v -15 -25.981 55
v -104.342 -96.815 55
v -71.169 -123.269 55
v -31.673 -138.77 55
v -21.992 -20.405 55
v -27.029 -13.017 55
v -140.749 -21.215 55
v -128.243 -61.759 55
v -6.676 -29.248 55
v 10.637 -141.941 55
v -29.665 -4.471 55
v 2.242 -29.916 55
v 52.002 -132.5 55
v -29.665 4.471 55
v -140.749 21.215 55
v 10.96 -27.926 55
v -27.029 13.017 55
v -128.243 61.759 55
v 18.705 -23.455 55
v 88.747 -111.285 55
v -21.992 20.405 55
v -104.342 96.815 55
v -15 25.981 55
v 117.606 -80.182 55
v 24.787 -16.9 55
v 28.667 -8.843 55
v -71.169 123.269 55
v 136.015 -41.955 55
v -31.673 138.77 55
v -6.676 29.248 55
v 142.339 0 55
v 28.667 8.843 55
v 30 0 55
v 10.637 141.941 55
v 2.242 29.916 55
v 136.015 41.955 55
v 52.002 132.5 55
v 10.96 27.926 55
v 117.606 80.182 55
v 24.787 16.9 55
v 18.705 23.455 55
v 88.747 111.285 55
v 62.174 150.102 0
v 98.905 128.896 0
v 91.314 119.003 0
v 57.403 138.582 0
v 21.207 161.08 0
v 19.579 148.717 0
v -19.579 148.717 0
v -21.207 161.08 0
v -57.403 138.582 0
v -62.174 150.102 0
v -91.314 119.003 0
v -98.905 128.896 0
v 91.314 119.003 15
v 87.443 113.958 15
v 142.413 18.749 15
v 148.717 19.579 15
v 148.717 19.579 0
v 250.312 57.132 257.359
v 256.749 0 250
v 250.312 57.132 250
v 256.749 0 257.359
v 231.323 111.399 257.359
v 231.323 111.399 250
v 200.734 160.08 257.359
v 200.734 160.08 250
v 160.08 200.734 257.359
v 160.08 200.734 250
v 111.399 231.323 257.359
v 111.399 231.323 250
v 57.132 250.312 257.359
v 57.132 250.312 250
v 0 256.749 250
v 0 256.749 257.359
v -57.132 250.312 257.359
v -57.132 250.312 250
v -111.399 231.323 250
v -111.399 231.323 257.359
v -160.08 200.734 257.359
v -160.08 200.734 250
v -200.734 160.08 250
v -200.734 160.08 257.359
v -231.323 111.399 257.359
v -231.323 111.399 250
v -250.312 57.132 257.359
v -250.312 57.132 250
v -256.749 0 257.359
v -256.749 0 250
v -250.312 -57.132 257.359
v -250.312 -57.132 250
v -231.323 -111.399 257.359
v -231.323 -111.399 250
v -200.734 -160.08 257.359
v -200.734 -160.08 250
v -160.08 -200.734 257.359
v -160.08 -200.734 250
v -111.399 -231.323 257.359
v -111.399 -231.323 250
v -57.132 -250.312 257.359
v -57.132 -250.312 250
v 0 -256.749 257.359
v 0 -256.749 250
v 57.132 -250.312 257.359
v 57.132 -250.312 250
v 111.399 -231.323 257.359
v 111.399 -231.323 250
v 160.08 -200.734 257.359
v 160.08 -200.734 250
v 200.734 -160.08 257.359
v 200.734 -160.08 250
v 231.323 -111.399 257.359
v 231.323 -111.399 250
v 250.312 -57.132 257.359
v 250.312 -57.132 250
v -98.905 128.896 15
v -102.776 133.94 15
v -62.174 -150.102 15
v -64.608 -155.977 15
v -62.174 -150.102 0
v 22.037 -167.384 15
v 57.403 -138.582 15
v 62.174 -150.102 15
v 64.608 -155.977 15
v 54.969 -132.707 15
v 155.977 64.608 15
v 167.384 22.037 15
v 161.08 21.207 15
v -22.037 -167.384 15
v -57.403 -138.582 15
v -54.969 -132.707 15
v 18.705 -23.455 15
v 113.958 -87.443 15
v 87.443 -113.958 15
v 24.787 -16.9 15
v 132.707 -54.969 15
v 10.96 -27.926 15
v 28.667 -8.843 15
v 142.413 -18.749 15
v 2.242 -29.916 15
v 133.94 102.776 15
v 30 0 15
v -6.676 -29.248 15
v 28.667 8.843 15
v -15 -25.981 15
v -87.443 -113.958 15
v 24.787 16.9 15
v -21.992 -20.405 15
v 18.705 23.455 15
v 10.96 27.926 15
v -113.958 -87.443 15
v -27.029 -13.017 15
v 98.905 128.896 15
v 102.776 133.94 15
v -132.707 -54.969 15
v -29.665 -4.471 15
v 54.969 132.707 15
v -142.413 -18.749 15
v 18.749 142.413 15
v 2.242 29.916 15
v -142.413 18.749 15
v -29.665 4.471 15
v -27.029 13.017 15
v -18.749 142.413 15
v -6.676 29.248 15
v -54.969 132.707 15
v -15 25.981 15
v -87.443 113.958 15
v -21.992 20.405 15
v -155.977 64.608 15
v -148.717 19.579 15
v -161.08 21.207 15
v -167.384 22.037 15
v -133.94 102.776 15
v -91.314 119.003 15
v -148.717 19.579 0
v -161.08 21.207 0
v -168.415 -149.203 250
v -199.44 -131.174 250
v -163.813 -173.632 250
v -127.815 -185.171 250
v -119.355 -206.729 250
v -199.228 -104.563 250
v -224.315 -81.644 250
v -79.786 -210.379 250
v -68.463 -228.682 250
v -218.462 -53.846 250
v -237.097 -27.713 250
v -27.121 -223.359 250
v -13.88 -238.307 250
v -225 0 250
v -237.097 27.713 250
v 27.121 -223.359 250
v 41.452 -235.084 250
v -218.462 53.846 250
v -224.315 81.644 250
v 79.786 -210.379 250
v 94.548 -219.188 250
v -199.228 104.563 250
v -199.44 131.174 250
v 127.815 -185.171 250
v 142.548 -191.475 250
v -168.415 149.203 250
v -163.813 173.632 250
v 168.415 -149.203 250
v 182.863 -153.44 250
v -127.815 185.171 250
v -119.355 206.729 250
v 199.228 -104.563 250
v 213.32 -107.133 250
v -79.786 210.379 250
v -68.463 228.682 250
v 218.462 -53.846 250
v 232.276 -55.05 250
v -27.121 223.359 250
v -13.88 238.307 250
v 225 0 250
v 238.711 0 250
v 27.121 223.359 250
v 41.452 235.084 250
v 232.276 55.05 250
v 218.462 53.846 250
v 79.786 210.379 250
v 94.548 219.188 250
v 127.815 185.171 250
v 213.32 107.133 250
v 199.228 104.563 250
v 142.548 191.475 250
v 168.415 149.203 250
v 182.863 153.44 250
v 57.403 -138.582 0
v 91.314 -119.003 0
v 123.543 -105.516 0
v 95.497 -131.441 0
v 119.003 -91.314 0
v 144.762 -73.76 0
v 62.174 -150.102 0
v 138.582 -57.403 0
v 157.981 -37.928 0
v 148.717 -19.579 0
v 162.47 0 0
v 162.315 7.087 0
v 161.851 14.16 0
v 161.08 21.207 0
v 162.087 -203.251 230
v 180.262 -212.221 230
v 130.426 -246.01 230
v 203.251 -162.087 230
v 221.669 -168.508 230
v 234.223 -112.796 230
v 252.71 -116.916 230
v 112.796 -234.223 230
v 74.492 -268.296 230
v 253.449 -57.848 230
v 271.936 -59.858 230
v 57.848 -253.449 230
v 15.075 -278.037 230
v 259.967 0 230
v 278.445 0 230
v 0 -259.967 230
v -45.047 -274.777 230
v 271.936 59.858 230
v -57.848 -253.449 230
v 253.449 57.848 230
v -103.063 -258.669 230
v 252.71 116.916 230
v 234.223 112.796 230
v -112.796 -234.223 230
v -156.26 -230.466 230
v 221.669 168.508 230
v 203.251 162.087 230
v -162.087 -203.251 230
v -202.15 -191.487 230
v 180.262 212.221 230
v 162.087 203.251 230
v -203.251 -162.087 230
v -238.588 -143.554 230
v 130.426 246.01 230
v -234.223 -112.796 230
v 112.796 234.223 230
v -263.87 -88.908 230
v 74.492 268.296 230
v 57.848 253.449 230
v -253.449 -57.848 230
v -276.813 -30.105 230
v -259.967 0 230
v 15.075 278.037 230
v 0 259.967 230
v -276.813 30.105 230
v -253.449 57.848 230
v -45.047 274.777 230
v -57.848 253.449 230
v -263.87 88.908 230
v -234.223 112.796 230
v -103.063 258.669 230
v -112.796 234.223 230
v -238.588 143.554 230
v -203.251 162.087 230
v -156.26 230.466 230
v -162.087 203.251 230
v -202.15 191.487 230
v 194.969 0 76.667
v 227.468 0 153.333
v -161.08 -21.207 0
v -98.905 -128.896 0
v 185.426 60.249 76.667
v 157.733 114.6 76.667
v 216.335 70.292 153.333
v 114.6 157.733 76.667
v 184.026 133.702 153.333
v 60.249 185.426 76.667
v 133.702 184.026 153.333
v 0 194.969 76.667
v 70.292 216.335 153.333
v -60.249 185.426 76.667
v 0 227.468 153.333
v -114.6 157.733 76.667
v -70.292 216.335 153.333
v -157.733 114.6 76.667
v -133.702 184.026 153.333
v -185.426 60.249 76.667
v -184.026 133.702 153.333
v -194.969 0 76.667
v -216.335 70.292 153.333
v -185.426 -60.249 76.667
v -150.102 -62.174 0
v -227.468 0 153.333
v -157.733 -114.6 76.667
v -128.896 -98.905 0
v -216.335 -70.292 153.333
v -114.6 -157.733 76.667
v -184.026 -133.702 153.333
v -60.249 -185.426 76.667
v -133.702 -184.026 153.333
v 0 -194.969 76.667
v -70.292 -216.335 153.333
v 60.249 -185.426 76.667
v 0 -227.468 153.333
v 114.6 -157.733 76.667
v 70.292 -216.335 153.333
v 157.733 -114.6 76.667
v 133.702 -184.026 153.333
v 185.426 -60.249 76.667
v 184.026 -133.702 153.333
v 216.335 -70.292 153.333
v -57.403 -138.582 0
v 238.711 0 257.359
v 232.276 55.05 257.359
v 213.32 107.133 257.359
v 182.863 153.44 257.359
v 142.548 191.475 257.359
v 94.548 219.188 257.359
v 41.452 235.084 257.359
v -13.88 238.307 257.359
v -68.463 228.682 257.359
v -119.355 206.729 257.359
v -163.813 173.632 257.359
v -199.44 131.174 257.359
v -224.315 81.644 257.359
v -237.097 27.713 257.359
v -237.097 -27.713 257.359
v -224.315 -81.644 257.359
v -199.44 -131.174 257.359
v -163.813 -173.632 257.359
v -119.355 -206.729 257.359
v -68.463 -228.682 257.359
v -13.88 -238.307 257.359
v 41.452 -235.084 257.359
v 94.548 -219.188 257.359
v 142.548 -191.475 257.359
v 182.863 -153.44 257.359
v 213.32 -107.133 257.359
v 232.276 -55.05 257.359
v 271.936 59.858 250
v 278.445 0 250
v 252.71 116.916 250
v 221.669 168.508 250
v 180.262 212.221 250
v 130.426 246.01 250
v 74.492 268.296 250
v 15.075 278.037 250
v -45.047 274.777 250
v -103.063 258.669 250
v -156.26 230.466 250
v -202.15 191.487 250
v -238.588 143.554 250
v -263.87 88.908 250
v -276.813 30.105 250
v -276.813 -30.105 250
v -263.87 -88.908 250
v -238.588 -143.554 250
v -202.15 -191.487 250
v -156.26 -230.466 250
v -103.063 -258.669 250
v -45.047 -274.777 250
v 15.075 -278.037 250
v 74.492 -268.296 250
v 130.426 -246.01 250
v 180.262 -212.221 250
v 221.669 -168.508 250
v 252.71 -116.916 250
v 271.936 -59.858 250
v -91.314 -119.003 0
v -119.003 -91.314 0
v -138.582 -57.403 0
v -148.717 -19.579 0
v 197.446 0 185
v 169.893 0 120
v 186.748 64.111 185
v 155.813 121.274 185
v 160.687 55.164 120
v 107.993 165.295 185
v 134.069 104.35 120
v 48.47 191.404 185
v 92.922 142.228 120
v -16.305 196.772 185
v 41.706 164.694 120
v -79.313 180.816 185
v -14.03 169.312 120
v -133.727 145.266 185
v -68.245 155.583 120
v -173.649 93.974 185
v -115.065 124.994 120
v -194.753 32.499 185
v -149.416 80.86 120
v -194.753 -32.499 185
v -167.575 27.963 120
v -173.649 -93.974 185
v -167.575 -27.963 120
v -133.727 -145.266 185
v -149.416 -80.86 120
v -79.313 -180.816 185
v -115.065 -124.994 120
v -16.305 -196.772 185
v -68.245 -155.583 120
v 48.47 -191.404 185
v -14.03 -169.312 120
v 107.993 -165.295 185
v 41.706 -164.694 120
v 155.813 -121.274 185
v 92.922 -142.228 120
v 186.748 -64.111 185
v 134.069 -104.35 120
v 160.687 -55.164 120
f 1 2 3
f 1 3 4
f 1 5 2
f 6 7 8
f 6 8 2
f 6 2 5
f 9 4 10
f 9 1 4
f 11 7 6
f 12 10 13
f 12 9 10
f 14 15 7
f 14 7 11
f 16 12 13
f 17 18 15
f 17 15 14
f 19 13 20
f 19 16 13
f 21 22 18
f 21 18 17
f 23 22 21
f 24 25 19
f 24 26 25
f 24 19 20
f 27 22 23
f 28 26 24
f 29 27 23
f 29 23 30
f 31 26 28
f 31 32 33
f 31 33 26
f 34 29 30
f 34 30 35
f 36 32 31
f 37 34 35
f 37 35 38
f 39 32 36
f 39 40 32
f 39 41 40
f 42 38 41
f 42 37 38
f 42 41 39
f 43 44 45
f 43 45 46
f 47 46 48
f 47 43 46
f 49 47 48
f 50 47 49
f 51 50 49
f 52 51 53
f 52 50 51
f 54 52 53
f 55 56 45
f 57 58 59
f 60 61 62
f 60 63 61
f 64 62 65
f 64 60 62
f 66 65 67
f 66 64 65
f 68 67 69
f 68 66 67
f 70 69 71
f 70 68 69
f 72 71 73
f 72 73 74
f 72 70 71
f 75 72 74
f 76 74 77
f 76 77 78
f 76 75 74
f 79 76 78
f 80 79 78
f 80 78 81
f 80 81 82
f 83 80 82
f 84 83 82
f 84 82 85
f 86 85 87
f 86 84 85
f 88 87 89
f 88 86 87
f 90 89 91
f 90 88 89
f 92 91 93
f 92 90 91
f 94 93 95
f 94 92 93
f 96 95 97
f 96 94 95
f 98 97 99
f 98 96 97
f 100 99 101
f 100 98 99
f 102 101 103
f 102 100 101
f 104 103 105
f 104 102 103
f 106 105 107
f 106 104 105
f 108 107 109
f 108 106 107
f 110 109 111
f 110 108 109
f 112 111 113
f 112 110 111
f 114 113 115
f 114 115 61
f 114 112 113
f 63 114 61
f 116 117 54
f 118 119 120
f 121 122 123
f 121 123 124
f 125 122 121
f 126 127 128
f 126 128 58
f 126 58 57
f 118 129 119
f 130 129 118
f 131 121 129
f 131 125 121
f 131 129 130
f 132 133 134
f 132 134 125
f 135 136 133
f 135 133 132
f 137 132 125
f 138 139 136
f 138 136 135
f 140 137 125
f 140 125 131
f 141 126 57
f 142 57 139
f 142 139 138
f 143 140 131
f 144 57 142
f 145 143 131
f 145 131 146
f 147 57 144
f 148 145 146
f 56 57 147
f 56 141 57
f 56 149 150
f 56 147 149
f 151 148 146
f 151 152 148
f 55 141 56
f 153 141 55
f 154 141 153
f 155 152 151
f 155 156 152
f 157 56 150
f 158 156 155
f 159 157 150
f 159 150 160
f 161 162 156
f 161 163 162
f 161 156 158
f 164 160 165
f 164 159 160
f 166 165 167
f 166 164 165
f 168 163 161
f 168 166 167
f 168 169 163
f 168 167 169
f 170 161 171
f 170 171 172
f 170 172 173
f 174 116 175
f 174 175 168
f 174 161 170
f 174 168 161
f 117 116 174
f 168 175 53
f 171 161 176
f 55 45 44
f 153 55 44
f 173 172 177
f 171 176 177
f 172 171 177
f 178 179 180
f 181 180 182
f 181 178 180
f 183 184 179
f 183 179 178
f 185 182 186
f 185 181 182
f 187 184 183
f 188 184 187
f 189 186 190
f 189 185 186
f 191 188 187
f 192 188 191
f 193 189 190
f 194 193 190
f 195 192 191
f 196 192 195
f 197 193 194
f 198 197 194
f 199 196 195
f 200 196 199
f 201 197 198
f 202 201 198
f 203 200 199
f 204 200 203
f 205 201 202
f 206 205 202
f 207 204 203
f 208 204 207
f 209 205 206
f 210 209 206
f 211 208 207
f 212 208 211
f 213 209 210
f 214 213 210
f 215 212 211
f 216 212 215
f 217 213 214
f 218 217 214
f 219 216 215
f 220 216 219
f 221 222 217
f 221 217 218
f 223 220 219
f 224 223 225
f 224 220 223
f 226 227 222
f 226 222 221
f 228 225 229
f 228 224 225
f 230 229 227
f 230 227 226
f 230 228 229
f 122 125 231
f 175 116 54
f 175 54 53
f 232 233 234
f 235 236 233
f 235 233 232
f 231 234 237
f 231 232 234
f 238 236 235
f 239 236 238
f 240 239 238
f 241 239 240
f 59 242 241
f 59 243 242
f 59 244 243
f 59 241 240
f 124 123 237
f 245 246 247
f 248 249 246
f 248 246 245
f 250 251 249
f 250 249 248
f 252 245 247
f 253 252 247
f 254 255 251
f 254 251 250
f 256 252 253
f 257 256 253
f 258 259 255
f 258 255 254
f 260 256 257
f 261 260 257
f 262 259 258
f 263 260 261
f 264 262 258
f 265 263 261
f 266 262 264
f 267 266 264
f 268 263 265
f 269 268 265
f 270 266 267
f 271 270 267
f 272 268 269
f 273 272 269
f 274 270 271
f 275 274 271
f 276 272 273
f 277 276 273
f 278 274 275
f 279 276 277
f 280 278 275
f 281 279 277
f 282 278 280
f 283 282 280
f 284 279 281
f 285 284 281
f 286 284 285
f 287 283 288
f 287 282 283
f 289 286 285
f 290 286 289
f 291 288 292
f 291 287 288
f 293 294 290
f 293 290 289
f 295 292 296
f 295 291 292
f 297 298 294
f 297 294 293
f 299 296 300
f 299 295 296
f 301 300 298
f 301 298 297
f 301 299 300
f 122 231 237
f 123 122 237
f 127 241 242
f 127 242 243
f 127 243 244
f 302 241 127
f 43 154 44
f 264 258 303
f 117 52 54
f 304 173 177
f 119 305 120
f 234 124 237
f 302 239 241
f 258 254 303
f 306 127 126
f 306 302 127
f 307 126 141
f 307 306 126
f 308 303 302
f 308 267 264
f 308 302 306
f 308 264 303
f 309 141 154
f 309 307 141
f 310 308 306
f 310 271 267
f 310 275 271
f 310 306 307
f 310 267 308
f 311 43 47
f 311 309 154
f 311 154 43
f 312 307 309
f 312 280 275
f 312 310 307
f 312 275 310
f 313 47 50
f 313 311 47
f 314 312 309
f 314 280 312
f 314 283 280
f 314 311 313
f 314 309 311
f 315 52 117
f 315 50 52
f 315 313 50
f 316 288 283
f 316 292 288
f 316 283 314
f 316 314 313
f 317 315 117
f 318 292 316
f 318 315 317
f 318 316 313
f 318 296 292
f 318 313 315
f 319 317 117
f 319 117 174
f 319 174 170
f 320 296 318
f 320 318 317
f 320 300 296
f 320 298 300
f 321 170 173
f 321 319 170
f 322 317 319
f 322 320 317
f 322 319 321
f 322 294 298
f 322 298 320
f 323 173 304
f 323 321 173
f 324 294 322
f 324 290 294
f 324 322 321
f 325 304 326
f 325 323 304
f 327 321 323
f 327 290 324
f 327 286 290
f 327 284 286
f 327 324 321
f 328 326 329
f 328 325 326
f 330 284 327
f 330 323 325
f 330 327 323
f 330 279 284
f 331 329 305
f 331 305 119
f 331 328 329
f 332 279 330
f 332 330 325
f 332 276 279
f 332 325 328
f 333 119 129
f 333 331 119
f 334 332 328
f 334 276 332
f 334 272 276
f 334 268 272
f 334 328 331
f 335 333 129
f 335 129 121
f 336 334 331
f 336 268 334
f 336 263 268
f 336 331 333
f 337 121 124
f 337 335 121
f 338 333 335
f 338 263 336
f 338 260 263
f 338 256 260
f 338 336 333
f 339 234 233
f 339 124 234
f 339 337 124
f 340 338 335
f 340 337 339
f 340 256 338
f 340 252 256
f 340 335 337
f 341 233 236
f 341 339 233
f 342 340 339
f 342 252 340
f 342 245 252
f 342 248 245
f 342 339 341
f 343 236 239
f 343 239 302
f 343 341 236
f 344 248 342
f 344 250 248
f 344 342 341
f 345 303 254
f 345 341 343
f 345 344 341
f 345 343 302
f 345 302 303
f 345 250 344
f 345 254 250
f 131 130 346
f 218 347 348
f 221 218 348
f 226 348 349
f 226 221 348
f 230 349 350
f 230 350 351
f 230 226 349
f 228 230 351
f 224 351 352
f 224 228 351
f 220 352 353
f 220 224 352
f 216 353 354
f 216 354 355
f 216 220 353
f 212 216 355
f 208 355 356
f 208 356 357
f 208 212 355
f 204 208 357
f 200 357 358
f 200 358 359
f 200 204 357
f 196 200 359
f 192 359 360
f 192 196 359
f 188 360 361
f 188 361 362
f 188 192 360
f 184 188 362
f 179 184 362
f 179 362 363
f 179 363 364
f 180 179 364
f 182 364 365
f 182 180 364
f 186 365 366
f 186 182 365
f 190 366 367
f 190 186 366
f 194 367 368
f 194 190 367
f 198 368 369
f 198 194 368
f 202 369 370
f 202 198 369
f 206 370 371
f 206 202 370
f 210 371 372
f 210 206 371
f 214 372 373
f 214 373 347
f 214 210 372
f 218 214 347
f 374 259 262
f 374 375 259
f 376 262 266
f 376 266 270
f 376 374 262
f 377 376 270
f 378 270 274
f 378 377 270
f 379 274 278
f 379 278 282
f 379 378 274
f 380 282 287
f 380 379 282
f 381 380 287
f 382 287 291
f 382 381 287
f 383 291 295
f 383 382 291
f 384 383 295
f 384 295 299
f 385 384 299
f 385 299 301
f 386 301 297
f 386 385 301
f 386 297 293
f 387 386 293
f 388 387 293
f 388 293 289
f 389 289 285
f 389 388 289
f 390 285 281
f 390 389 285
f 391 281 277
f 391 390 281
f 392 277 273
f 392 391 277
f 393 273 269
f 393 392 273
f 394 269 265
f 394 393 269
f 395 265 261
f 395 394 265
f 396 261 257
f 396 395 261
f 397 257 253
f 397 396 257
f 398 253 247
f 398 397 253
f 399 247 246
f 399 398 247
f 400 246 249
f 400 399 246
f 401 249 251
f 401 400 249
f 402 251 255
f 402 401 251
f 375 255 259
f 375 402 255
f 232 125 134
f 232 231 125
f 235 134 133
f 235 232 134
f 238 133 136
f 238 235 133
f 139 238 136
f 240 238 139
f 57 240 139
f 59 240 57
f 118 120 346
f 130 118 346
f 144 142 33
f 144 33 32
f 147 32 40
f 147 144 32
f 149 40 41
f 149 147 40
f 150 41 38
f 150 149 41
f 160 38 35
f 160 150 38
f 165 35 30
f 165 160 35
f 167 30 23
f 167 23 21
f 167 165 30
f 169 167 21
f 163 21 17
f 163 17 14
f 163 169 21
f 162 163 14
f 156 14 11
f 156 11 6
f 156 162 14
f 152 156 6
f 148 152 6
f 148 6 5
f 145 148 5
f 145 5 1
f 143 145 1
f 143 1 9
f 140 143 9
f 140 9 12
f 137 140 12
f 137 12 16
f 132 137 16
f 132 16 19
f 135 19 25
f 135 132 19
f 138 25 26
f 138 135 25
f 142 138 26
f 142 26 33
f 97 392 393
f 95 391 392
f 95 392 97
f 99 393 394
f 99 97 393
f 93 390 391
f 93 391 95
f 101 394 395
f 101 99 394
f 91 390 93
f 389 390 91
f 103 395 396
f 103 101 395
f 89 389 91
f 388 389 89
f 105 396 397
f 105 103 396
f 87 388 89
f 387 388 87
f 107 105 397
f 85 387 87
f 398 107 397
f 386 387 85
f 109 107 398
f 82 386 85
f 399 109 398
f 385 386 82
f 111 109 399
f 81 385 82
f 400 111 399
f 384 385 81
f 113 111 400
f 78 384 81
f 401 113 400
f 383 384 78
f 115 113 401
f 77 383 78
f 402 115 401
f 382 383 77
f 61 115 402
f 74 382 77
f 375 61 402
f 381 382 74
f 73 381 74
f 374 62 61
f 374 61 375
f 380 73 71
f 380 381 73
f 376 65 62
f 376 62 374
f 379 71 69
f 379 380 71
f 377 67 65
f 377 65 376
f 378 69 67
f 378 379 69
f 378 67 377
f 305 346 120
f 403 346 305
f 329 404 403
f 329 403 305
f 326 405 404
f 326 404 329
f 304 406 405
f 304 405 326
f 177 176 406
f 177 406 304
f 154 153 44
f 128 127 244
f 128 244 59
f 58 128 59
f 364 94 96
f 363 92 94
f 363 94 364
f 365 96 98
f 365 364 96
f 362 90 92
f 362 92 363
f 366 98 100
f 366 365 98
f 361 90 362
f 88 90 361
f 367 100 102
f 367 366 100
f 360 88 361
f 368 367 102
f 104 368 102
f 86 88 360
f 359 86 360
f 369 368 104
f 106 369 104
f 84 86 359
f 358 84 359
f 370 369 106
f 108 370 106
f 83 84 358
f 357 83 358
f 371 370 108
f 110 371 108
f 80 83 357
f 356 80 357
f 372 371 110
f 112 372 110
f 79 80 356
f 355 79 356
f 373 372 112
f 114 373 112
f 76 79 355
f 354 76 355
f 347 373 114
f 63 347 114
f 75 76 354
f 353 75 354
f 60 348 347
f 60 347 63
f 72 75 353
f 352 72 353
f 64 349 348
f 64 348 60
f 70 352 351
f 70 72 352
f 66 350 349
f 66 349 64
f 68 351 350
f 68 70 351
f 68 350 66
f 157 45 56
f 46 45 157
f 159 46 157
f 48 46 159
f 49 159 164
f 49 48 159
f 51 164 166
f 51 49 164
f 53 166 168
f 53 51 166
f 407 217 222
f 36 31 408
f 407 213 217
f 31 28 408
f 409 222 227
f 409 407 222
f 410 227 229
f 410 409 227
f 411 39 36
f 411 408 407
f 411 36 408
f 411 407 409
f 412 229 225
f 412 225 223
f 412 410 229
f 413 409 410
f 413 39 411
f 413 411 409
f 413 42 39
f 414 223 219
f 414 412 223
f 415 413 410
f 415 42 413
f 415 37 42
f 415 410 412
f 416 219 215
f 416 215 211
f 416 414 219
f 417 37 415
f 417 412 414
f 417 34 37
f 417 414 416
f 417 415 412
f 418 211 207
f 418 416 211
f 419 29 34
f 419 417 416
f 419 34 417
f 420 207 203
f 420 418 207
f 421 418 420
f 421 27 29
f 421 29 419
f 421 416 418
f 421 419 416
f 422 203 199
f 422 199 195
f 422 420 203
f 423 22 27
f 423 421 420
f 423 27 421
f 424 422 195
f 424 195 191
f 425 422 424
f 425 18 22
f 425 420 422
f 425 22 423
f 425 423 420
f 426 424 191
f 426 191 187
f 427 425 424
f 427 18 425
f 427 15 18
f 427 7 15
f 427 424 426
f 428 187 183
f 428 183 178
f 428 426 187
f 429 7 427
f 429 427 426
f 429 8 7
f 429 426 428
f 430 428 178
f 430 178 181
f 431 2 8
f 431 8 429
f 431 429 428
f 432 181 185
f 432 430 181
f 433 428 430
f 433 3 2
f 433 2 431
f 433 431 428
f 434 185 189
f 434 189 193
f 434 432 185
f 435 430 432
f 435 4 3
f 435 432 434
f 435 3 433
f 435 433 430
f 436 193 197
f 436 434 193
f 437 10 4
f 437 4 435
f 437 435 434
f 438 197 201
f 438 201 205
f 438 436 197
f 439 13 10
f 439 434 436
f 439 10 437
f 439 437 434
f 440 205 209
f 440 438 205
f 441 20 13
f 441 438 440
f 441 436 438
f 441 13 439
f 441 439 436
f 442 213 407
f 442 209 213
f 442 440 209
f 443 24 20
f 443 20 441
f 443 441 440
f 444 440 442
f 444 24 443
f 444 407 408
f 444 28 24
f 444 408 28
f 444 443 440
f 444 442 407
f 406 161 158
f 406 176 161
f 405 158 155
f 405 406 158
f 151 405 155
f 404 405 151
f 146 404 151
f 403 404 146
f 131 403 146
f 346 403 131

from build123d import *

# Parameters (mm, degrees)
F3_DEPTH = 15


with BuildPart() as f1:
    # F0 (on Front) → F1 (revolve)
    with BuildSketch(Plane.XZ):
        Polygon((30, 55), (30, 15), (143.6414506771, 15), (150, 0), (162.4696655932, 0), (259.9674218774, 230), (268.4454876412, 250), (256.7487955093, 250), (256.7487955093, 257.3588024481), (238.7105971575, 257.3588024481), (238.7105971575, 250), (225, 250), (142.3388588025, 55), align=None)
        Polygon((268.4454876412, 250), (259.9674218774, 230), (278.4454876412, 230), (278.4454876412, 250), align=None)
    revolve(axis=Axis((0, 0, 38.856908679), (0, 0, 1)))

    # F2 (on face) → F3 (cut, through all)
    with BuildSketch(Plane(origin=(0, 0, 0), x_dir=(1, 0, 0), z_dir=(0, 0, -1))):
        with BuildLine():
            Line((-62.1744492844, 150.1023986955), (-57.4025148548, 138.5819298767))
            ThreePointArc((-57.4025148548, 138.5819298767), (0, 150), (57.4025148548, 138.5819298767))
            Line((57.4025148548, 138.5819298767), (62.1744492844, 150.1023986955))
            ThreePointArc((62.1744492844, 150.1023986955), (0, 162.4696655932), (-62.1744492844, 150.1023986955))
        make_face()
        with BuildLine():
            ThreePointArc((148.7167292061, -19.578928833), (129.9038105677, -75), (91.3142143513, -119.0030010437))
            Line((91.3142143513, -119.0030010437), (98.9052657971, -128.8958518943))
            ThreePointArc((98.9052657971, -128.8958518943), (140.702857748, -81.2348327966), (161.0797150815, -21.2065468011))
            Line((161.0797150815, -21.2065468011), (148.7167292061, -19.578928833))
        make_face()
        with BuildLine():
            ThreePointArc((-91.3142143513, -119.0030010437), (-129.9038105677, -75), (-148.7167292061, -19.578928833))
            Line((-148.7167292061, -19.578928833), (-161.0797150815, -21.2065468011))
            ThreePointArc((-161.0797150815, -21.2065468011), (-140.702857748, -81.2348327966), (-98.9052657971, -128.8958518943))
            Line((-98.9052657971, -128.8958518943), (-91.3142143513, -119.0030010437))
        make_face()
        with BuildLine():
            Line((-91.3142143513, -119.0030010437), (0, 0))
            Line((0, 0), (-148.7167292061, -19.578928833))
            ThreePointArc((-148.7167292061, -19.578928833), (-129.9038105677, -75), (-91.3142143513, -119.0030010437))
        make_face()
        with BuildLine():
            Line((-57.4025148548, 138.5819298767), (0, 0))
            Line((0, 0), (57.4025148548, 138.5819298767))
            ThreePointArc((57.4025148548, 138.5819298767), (0, 150), (-57.4025148548, 138.5819298767))
        make_face()
        with BuildLine():
            Line((148.7167292061, -19.578928833), (0, 0))
            Line((0, 0), (91.3142143513, -119.0030010437))
            ThreePointArc((91.3142143513, -119.0030010437), (129.9038105677, -75), (148.7167292061, -19.578928833))
        make_face()
        with BuildLine():
            Line((-82.5295173068, 199.2438799781), (-62.1744492844, 150.1023986955))
            ThreePointArc((-62.1744492844, 150.1023986955), (0, 162.4696655932), (62.1744492844, 150.1023986955))
            Line((62.1744492844, 150.1023986955), (82.5295173068, 199.2438799781))
            Line((82.5295173068, 199.2438799781), (-82.5295173068, 199.2438799781))
        make_face()
        with BuildLine():
            ThreePointArc((-98.9052657971, -128.8958518943), (-140.702857748, -81.2348327966), (-161.0797150815, -21.2065468011))
            Line((-161.0797150815, -21.2065468011), (-213.815020263, -28.1492814393))
            Line((-213.815020263, -28.1492814393), (-131.2855029562, -171.0945985388))
            Line((-131.2855029562, -171.0945985388), (-98.9052657971, -128.8958518943))
        make_face()
        with BuildLine():
            ThreePointArc((161.0797150815, -21.2065468011), (140.702857748, -81.2348327966), (98.9052657971, -128.8958518943))
            Line((98.9052657971, -128.8958518943), (131.2855029562, -171.0945985388))
            Line((131.2855029562, -171.0945985388), (213.815020263, -28.1492814393))
            Line((213.815020263, -28.1492814393), (161.0797150815, -21.2065468011))
        make_face()
    extrude(amount=-F3_DEPTH, mode=Mode.SUBTRACT)


solid = f1.part
